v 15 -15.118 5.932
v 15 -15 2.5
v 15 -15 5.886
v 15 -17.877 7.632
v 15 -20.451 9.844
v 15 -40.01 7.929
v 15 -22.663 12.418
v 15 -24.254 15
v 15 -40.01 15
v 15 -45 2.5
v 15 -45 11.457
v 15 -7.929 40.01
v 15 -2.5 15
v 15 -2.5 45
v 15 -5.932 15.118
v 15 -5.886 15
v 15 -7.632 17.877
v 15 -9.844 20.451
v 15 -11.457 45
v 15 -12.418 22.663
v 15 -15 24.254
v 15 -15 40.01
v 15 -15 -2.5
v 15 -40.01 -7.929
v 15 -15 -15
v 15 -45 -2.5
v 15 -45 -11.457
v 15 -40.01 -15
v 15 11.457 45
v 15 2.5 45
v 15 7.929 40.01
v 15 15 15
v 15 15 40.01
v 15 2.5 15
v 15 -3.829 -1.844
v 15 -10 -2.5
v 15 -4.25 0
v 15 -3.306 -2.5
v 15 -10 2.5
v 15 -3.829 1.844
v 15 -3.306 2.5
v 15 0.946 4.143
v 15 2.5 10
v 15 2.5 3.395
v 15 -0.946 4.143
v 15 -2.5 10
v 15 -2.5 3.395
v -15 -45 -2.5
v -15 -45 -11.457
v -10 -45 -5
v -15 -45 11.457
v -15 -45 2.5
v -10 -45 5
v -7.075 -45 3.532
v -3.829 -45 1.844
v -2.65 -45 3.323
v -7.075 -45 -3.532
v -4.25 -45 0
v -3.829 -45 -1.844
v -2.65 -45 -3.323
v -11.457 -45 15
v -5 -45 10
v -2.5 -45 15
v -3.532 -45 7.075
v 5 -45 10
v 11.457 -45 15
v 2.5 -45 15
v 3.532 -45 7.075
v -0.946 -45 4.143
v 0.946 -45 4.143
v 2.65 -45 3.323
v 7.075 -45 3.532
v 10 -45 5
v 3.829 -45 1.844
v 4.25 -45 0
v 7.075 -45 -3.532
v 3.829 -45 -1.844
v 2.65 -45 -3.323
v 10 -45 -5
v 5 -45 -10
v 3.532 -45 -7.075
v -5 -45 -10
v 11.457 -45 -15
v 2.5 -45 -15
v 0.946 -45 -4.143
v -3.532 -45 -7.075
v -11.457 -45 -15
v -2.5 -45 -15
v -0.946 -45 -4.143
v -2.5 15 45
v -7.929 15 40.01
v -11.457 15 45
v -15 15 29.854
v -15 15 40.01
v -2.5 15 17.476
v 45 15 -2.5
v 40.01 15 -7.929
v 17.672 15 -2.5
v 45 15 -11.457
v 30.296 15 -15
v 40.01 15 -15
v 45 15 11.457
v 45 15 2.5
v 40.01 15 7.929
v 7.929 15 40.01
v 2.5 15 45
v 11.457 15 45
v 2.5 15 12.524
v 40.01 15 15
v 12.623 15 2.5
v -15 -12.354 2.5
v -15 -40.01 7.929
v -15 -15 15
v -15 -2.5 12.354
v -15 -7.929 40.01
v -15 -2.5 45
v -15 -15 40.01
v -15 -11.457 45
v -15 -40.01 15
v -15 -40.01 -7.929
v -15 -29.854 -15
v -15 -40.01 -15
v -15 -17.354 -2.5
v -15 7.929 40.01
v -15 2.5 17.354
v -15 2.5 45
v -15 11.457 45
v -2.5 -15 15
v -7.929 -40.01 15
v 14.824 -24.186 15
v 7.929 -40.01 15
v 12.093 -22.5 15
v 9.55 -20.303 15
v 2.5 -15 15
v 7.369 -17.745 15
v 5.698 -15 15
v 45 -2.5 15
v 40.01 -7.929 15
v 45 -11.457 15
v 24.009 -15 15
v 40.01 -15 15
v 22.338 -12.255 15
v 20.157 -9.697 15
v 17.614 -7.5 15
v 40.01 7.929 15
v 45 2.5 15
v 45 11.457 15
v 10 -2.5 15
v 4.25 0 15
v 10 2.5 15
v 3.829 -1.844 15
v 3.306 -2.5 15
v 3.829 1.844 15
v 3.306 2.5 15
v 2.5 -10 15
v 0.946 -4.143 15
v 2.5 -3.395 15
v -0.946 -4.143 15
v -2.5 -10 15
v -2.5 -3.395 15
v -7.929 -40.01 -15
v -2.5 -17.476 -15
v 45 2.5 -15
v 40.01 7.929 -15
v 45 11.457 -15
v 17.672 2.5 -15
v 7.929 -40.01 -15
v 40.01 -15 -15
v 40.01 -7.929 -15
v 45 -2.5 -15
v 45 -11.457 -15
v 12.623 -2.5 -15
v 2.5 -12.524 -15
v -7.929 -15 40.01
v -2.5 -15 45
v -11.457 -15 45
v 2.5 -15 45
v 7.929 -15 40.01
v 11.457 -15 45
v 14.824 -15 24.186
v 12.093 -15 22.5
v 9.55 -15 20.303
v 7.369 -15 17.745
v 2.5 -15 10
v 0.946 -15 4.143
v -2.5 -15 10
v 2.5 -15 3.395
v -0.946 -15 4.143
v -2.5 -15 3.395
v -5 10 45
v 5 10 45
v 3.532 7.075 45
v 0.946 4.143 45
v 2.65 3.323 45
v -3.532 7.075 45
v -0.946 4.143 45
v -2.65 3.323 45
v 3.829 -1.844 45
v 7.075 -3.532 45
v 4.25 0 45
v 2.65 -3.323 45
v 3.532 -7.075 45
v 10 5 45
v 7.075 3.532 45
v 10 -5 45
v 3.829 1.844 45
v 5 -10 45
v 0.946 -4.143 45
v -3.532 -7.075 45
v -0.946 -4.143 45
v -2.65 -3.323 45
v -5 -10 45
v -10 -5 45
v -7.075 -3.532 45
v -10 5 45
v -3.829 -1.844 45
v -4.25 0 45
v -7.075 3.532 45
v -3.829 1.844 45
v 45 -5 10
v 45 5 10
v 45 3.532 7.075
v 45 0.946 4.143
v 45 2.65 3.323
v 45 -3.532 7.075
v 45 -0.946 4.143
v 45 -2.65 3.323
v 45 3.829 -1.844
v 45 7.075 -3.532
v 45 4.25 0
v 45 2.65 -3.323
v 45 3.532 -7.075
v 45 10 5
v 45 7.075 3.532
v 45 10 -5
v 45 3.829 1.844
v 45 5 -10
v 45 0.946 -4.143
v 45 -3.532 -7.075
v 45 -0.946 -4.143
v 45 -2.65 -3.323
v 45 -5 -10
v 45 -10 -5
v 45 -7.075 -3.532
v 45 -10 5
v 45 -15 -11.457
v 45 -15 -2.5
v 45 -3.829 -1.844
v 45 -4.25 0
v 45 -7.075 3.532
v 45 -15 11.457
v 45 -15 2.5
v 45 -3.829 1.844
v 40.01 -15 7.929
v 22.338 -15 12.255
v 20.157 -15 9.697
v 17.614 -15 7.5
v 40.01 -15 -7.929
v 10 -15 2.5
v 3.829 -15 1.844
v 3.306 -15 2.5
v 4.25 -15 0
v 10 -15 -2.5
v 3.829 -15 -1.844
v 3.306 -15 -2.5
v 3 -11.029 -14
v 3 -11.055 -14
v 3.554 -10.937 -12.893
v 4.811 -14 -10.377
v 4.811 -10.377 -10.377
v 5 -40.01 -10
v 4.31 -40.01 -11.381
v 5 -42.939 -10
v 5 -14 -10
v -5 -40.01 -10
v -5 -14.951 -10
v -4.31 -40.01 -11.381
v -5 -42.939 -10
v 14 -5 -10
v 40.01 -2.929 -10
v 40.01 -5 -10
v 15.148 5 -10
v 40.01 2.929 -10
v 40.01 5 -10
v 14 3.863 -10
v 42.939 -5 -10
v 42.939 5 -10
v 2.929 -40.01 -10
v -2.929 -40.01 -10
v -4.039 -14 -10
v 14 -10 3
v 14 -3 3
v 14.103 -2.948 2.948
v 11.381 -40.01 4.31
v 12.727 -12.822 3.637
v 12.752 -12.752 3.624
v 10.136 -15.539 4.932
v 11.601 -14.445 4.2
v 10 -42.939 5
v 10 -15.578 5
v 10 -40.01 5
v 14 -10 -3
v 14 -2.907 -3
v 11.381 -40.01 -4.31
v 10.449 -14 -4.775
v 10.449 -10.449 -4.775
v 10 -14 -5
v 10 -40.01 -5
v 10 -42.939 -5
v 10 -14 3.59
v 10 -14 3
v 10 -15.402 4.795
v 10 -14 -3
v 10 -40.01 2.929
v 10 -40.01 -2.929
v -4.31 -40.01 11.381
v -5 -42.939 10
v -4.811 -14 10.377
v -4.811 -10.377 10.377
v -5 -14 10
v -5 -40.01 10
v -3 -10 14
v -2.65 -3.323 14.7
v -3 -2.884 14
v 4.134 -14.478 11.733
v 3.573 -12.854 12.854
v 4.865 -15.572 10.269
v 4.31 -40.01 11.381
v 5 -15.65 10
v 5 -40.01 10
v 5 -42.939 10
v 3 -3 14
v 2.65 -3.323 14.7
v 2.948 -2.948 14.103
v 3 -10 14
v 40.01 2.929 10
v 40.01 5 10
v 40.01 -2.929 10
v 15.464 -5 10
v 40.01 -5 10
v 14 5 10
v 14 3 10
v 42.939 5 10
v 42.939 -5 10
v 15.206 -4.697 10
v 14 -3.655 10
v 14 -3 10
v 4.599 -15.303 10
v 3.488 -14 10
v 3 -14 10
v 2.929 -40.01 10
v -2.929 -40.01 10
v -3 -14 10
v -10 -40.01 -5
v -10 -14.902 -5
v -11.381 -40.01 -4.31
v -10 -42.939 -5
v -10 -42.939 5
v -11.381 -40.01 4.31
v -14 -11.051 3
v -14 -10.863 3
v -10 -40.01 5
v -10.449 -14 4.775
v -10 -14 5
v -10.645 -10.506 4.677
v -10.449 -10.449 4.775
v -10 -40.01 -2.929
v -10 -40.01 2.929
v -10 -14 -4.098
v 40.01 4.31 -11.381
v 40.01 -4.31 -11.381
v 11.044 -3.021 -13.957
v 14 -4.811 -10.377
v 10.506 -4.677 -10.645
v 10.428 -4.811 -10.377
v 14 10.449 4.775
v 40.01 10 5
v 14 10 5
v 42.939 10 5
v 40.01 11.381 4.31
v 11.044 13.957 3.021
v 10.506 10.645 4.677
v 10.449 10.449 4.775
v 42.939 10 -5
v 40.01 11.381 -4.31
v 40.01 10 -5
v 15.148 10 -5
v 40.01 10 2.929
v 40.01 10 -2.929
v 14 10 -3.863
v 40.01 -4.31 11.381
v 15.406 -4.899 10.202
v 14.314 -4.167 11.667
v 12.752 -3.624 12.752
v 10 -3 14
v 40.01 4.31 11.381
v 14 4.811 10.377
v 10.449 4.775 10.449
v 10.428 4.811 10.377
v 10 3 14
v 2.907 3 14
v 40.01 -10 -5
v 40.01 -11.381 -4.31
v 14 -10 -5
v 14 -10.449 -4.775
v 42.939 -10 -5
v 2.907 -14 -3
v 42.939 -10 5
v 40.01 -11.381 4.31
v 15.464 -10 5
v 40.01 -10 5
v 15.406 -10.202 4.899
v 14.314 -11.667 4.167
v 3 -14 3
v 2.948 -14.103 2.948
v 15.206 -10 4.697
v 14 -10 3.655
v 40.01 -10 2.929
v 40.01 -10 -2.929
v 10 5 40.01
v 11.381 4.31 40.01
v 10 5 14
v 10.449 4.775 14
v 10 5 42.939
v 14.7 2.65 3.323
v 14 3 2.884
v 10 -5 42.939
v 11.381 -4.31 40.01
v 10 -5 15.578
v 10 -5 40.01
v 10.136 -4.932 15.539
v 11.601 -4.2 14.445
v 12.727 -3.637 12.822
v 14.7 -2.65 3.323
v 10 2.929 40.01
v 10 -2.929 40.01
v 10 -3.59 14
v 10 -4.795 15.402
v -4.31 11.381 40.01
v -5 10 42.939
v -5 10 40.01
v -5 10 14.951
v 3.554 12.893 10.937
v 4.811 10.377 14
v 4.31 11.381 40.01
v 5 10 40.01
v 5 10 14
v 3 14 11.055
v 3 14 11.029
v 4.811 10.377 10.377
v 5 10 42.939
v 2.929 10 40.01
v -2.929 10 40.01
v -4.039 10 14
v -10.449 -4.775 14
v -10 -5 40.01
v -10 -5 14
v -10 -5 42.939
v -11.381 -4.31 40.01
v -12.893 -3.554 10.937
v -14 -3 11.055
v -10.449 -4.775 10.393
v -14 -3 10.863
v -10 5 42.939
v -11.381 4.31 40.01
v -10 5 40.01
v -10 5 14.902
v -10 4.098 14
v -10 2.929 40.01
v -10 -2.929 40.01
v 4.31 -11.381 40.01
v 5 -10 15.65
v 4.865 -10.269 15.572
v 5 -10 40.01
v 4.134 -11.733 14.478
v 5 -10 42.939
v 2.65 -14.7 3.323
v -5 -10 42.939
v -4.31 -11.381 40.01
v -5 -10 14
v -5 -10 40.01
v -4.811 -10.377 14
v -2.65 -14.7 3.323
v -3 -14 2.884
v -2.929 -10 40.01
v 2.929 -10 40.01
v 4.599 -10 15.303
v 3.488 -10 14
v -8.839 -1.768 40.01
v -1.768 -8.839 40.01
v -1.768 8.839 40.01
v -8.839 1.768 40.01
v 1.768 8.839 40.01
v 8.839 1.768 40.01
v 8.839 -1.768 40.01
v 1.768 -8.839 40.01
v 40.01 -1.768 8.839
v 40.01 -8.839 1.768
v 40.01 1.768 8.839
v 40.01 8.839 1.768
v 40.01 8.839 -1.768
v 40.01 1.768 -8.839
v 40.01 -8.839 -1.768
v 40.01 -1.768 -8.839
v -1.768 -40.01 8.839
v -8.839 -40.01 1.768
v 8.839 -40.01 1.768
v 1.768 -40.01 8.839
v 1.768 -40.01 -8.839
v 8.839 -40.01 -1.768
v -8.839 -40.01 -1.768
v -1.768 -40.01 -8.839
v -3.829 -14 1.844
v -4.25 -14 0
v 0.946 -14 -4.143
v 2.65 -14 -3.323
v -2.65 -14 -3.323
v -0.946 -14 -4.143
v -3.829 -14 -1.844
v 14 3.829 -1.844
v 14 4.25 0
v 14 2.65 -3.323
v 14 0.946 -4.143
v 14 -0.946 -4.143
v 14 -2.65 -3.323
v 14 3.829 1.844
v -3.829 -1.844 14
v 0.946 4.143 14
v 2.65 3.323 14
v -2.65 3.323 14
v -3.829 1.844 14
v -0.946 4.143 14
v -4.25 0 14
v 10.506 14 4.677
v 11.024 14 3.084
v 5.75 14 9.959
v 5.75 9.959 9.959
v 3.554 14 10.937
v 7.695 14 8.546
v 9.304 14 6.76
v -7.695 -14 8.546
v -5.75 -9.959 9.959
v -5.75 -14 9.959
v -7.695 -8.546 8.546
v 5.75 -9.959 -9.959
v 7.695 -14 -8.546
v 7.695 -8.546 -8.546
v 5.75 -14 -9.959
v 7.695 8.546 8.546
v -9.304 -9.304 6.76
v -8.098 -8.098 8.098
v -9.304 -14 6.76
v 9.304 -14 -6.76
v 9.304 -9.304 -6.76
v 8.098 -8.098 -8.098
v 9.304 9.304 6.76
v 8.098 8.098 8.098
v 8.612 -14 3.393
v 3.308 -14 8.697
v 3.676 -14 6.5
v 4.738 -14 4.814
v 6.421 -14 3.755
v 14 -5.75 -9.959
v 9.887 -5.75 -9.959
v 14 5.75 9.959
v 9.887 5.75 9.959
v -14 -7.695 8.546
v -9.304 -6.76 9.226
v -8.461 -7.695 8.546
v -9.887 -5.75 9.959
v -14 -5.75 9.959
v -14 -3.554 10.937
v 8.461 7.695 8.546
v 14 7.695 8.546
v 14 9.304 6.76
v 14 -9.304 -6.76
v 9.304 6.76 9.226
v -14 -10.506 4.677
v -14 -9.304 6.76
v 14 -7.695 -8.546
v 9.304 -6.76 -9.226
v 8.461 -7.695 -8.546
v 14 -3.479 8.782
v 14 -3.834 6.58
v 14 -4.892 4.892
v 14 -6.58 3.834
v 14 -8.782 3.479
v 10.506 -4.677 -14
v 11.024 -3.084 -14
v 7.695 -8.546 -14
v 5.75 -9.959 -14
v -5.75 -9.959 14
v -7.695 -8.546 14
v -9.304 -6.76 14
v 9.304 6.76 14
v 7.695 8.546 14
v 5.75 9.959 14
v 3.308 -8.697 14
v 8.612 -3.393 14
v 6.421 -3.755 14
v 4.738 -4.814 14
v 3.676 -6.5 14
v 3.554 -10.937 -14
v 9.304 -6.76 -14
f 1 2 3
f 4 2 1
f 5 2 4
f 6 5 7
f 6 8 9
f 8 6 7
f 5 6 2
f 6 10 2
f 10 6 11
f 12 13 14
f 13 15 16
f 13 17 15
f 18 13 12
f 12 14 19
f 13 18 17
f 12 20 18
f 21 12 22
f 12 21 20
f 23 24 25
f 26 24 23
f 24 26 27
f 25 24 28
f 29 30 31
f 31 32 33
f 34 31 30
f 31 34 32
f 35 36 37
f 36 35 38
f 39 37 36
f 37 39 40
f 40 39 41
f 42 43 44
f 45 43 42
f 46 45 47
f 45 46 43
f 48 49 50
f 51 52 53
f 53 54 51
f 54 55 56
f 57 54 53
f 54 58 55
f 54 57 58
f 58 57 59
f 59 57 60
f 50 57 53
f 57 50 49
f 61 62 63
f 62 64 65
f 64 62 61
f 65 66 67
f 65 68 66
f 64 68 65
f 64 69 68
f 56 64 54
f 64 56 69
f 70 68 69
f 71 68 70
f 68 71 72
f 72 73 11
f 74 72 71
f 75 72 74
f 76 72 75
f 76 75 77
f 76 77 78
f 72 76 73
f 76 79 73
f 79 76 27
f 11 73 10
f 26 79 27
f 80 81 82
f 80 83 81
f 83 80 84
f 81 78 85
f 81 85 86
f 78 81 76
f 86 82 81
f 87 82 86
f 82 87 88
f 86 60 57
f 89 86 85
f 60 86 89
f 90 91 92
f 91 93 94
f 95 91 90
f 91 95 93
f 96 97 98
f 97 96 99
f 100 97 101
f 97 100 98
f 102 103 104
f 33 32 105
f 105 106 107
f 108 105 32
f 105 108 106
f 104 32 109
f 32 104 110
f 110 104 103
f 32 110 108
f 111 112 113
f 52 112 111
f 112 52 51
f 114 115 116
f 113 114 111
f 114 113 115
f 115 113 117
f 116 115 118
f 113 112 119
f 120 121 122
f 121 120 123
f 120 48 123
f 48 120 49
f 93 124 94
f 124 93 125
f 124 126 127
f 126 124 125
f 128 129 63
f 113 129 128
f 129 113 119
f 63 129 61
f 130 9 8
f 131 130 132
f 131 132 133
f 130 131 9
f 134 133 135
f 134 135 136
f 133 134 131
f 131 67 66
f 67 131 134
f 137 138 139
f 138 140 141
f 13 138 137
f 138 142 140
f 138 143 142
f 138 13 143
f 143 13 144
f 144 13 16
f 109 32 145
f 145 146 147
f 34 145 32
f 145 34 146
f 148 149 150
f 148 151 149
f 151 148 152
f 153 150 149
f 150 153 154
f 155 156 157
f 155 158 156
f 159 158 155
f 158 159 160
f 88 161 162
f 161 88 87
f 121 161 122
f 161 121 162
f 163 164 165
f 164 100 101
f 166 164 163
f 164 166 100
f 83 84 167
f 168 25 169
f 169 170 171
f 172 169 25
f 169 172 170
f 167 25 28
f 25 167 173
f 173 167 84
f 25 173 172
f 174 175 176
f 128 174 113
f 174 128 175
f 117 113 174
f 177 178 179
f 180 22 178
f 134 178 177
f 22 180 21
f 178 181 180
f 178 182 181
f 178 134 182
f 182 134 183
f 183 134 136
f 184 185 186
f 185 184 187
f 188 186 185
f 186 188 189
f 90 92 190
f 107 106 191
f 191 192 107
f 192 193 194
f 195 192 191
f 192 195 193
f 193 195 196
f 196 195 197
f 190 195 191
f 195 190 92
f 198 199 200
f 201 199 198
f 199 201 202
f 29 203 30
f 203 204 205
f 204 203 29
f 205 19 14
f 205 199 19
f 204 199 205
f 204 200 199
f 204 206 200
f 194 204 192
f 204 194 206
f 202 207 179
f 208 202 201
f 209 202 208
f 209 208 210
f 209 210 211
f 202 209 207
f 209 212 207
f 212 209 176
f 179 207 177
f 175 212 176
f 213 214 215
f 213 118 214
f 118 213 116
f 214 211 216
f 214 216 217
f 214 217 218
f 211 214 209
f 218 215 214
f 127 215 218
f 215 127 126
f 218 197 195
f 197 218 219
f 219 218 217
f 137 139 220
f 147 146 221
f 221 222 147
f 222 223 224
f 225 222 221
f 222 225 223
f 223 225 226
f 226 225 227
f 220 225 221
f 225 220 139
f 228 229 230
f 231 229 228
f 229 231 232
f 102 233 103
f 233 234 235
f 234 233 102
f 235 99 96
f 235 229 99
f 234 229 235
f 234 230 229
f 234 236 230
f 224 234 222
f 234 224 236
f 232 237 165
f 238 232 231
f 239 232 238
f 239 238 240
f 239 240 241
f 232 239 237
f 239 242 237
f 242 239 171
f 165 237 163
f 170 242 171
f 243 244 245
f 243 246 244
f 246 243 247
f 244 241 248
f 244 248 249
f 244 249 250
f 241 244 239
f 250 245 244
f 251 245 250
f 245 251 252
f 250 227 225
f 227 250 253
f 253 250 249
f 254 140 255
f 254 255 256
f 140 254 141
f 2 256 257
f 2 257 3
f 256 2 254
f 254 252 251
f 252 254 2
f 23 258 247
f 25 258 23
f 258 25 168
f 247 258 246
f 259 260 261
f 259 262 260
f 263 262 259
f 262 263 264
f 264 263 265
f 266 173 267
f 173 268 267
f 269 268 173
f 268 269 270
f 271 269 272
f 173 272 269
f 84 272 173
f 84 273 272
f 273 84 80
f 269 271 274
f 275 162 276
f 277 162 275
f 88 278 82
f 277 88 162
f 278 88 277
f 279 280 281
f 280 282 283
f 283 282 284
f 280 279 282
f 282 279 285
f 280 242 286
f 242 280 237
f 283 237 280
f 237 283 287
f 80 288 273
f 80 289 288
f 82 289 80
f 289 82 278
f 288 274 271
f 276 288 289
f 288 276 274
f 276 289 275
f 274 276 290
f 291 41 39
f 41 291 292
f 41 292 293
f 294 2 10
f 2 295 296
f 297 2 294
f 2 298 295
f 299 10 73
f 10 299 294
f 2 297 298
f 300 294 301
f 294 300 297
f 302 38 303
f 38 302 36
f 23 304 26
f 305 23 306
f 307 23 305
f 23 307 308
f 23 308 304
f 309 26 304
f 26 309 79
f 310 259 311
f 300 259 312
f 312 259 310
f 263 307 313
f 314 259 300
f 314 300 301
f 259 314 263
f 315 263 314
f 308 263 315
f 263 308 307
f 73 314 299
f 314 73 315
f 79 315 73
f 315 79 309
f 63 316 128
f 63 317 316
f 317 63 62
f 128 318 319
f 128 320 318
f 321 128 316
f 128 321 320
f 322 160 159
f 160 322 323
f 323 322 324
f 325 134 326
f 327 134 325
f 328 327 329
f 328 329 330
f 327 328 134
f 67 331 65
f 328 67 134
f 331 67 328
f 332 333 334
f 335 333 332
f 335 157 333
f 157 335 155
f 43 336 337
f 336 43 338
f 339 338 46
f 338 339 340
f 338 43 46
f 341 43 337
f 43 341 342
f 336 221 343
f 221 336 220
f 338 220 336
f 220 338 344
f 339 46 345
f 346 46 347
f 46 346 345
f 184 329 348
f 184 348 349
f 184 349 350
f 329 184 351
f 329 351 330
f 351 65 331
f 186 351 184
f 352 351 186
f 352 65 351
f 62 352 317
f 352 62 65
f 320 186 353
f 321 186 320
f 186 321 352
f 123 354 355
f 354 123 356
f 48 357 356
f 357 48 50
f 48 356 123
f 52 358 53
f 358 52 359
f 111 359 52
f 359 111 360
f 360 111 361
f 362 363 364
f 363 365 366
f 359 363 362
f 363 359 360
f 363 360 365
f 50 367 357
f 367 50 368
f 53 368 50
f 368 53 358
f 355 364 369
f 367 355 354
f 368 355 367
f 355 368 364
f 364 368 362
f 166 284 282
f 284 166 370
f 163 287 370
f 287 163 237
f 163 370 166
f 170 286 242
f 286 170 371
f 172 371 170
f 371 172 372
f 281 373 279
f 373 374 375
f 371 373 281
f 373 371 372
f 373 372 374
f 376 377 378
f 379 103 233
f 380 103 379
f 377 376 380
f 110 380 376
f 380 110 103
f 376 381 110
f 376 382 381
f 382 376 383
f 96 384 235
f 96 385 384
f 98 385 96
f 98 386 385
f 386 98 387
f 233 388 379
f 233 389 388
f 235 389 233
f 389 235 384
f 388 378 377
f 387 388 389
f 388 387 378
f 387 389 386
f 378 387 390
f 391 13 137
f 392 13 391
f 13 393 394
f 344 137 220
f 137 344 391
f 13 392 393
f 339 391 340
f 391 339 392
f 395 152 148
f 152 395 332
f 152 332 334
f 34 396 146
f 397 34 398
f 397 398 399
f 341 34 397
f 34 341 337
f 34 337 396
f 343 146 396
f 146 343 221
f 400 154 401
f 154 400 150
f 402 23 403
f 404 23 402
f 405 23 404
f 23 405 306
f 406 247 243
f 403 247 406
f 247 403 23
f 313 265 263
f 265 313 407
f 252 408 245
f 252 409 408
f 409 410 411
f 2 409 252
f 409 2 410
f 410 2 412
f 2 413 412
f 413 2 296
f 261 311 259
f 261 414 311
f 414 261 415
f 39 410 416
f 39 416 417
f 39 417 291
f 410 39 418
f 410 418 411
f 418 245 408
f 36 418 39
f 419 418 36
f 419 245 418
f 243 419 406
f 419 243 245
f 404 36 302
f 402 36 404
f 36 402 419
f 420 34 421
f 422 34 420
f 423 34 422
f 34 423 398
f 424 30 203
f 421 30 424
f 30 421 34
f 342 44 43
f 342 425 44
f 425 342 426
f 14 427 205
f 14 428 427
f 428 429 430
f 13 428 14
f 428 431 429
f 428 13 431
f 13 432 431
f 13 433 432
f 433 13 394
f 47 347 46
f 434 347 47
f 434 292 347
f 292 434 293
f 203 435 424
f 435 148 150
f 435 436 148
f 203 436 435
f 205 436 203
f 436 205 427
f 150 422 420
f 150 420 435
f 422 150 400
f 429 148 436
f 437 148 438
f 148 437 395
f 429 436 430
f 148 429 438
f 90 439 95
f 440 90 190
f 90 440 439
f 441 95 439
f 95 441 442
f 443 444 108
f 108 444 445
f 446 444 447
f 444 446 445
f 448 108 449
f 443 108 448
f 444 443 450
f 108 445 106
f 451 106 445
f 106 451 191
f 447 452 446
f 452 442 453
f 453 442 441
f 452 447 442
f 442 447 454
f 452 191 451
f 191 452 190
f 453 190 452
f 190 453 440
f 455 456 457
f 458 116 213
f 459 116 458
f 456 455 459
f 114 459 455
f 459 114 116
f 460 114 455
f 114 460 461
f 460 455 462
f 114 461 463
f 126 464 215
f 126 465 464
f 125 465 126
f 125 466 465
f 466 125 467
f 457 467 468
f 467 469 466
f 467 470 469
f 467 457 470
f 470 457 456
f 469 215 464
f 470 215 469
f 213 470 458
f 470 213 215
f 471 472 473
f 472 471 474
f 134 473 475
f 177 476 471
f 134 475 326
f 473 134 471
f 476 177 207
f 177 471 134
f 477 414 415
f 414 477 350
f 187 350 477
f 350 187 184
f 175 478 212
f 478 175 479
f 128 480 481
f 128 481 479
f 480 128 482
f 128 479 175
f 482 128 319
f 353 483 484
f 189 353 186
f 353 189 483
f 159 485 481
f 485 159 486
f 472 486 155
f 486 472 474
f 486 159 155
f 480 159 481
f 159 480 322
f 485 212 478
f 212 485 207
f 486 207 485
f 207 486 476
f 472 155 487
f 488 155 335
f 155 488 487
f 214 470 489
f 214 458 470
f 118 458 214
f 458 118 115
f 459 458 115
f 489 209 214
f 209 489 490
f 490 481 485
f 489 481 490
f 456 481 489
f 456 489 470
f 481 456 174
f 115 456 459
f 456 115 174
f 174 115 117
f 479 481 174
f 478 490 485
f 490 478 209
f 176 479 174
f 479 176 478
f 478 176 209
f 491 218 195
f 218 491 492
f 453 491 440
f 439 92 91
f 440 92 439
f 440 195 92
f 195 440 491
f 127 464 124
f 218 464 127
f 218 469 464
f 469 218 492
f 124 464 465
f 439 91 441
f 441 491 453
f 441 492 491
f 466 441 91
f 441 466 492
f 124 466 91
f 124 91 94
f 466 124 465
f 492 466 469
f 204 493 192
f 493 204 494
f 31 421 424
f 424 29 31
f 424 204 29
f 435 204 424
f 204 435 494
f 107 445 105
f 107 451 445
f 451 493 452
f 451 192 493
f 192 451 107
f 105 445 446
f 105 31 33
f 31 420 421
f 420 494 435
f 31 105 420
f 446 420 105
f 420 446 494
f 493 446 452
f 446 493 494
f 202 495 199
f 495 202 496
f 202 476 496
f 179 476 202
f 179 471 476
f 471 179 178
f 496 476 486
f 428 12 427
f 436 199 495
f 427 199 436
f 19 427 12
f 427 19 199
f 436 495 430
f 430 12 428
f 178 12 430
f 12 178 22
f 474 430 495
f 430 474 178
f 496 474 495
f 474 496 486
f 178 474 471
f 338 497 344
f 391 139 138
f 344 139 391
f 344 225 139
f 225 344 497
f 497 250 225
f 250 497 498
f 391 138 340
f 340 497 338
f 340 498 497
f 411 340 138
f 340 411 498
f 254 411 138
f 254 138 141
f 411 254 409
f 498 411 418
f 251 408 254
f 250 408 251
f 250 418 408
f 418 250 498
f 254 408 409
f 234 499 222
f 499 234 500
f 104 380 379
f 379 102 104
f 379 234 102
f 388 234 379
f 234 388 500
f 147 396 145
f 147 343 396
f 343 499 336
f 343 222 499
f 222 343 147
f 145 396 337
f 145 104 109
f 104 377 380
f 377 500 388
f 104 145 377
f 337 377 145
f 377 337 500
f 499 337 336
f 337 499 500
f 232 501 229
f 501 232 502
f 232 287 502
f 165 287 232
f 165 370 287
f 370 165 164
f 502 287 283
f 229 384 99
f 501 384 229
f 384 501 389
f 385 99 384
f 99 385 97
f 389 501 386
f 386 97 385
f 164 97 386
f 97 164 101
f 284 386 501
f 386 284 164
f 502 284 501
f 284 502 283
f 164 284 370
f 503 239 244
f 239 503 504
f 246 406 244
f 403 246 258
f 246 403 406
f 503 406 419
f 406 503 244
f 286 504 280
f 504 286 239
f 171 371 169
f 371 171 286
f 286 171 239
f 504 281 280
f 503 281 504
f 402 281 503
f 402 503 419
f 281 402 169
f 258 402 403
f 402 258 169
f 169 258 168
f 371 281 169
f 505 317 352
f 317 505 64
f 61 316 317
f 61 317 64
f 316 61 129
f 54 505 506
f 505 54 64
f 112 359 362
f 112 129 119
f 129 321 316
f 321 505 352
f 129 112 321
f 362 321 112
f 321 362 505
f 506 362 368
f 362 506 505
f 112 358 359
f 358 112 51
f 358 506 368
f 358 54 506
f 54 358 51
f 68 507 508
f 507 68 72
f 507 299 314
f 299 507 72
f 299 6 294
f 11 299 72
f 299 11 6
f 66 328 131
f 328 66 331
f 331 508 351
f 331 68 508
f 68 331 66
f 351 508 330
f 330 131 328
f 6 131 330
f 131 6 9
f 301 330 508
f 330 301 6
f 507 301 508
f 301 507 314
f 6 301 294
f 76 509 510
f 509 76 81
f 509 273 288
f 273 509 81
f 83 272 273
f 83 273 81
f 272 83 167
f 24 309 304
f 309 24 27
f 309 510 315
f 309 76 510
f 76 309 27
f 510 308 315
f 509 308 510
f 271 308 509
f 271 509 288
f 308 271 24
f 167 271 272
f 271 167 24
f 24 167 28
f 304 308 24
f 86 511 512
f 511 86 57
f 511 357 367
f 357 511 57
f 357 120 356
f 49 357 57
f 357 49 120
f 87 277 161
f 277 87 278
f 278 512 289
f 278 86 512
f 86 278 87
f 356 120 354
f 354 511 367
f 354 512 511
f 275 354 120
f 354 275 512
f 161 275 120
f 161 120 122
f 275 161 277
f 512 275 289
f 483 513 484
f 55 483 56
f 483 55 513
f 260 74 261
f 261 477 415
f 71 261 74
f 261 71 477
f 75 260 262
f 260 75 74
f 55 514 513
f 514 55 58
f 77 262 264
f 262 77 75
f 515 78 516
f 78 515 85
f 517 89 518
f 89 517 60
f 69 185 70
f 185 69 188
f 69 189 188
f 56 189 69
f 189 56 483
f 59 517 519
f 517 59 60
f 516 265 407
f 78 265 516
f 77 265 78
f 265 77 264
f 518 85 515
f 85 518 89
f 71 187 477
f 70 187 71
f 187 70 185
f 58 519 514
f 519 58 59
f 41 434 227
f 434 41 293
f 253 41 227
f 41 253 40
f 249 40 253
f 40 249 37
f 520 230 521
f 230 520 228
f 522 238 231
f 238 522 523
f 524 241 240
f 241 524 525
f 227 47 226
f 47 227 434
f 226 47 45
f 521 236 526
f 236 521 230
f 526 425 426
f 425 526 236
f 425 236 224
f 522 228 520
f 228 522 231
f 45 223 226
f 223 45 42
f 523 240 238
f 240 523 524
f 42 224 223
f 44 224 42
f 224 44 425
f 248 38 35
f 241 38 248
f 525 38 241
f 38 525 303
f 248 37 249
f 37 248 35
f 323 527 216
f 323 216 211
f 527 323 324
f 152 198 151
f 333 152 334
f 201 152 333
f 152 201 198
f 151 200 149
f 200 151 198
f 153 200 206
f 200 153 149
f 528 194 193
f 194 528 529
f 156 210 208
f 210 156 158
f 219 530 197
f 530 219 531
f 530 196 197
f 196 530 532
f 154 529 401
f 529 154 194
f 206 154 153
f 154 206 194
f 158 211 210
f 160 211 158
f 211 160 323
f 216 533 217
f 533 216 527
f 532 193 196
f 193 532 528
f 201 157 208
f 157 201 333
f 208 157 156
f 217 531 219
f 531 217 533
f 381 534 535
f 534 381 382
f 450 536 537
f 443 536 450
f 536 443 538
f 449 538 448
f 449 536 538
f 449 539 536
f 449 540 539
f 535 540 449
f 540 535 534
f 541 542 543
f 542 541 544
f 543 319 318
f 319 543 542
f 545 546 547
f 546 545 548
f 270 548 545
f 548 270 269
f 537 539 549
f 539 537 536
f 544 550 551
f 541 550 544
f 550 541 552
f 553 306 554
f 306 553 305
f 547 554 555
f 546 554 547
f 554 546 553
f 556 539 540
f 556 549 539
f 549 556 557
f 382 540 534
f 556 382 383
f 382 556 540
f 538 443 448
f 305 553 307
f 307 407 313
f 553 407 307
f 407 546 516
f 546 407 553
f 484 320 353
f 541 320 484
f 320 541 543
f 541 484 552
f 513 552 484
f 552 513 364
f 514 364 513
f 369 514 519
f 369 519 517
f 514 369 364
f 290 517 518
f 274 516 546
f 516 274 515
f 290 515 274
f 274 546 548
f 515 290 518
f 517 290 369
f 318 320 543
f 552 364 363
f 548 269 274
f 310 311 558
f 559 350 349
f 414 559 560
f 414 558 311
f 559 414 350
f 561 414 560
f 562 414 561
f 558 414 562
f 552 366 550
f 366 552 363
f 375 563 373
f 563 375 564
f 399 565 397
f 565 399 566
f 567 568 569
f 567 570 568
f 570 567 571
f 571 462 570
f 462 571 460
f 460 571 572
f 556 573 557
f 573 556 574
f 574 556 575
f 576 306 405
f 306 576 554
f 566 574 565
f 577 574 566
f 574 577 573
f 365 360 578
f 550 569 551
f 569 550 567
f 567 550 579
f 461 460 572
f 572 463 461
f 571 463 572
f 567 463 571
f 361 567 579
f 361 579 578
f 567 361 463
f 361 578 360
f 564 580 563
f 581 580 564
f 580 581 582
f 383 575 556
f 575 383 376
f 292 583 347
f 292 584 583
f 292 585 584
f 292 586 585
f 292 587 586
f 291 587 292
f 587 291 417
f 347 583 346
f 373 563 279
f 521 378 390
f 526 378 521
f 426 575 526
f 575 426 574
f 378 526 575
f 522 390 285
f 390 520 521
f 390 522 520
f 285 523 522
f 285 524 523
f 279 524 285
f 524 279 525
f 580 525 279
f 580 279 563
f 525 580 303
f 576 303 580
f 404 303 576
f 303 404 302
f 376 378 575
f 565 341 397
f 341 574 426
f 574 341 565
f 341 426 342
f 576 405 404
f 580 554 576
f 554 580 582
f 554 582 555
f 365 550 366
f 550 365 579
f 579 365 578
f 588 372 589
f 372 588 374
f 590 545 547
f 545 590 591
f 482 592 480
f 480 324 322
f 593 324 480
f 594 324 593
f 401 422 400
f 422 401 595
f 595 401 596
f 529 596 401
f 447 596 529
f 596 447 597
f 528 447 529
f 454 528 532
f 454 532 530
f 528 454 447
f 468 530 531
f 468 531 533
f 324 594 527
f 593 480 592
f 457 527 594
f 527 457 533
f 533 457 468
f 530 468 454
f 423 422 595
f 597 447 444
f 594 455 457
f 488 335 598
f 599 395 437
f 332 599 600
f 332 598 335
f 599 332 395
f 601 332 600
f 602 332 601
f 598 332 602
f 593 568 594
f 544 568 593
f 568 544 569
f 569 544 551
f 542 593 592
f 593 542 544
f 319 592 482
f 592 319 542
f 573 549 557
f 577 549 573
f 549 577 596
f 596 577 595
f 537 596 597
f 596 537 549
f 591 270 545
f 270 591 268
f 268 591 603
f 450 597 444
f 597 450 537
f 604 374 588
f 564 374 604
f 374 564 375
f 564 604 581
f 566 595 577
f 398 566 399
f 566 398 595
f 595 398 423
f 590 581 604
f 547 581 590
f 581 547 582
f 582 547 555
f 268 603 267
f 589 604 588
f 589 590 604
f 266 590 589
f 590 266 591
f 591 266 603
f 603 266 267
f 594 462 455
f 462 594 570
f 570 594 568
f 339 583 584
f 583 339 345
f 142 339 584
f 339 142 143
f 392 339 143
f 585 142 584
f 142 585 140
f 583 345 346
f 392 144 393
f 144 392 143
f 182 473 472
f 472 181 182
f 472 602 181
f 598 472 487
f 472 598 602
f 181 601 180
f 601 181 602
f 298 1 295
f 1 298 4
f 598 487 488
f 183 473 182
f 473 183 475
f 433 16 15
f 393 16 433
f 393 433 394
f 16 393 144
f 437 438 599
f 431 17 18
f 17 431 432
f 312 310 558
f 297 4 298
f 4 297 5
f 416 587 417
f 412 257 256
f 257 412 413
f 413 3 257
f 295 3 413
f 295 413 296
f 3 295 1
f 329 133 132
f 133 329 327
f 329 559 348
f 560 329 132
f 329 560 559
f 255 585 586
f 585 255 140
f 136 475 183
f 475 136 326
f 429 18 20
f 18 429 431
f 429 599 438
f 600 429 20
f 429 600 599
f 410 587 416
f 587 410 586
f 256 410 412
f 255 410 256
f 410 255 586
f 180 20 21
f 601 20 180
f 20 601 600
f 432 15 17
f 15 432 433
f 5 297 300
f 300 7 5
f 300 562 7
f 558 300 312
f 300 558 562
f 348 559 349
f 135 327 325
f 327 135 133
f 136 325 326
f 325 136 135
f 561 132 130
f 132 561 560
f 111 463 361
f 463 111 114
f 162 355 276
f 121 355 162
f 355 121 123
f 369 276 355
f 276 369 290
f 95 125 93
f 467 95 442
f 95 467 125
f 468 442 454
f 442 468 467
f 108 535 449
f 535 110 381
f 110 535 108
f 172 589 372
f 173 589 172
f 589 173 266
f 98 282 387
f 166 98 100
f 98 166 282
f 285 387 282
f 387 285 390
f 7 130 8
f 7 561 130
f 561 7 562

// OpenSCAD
// file: globals.scad
/*
Most things in this file is represented as one millimeter, so keep that in mind while changing things.
Some of the setting are not mm but at variables that you can set, such as 2*x=2x and you are setting what x is.
I will try to specify when things are variables and not exact measurements.
*/

obj_leg = 30;
leg_length = 5.5;
small_number = 0.001;
metal_core_rode_global = 5;


///////////////// number of holes /////////////////////
z_hole_number = 8;
other_holes = 8;

///////////////// Pins /////////////////////

//pins that poke out
ball_size = 10;
pin_height = 20;
pin_diameter = 6;


//holes
hole_ball_size = ball_size;
hole_pin_height = pin_height;
hole_pin_diameter = pin_diameter;

///////////////// Z THINGS /////////////////////

berring_slot_width = 7.5;
berring_slot_depth = 6.5;
metal_core_rode = 5;

///////////////// X THINGS /////////////////////

//male dove tails
max_width=10;
min_width=5;
depth=5;
height=obj_leg/2;

//female dove tails, this is found on the y mounts
girl_max_width=11;
girl_min_width=5;
girl_depth=5;
girl_height=obj_leg;


///////////////// Y THINGS /////////////////////
/*
The Y is so normal that all of those global variables at the top should change all of the setting in it, this section is set her incase there are variables set in the future development of this project.
*/
// file: include.scad
//////////////////      END SECTION       //////////////////

	module added_pins(){
		difference(){
			union(){
				translate([30/(15/4),obj_leg*leg_length,30/(15/4)]) pin();
				translate([30/(15/4)+14.5,obj_leg*leg_length,30/(15/4)+14]) pin();
			}
			union(){
							translate([30/(15/4)+13.5,obj_leg*leg_length-20,30/(15/4)+5])cube(size=[2,40,15]);
							translate([30/(15/4)+7.5,obj_leg*leg_length-20,30/(15/4)+15])rotate([0,90,0]) cube(size=[2,40,15]);	

							translate([30/(15/4)-1,obj_leg*leg_length-20,30/(15/4)-8])cube(size=[2,40,15]);
							translate([30/(15/4)-10,obj_leg*leg_length-20,30/(15/4)+1])rotate([0,90,0]) cube(size=[2,40,15]);
			}
		}
	}
	module taken_pins() {
		translate([30/(15/4)+14,obj_leg*leg_length-10,30/(15/4)]) mirror_pin();
		translate([30/(15/4),obj_leg*leg_length-10,30/(15/4)+15]) mirror_pin();
	}


//////////////////      OTHER STUFF       //////////////////

	module holes() {
		rotate([0,0,90]) for(y=[0:other_holes])
		translate([obj_leg+y*15,-15.5,7.5]) union() {
			translate([7.5,0,15]) hole_up();
			hole_down();
		}
	}
	module extend_holes() {
	module top(){
		rotate([0,0,90]) for(y=[0:other_holes+1])
		translate([(30/4)+y*15,-15.5,7.5]) union() {
			translate([7.5,0,15]) hole_up();
		}
	}
	module bottom(){
		rotate([0,0,90]) for(y=[0:other_holes+2])
		translate([(30/4)+y*15,-15.5,7.5]) union() {
			hole_down();
		
}
	}
	union(){
		top();
		bottom();
	}
	}

	module hole() {
		union() {
			rotate([90, 90, 0]) cylinder(h=40, d=hole_pin_diameter, center=true);
			translate([0,7.5,0]) sphere(d=hole_ball_size);
			translate([0,-6,0]) sphere(d=hole_ball_size);
		}
	}
	module hole_up() {
		union() {
			rotate([90, 90, 0]) cylinder(h=40, d=hole_pin_diameter, center=true);
			translate([0,7.5,10]) cylinder(h=hole_pin_height, d=hole_pin_diameter, center=true);
			translate([0,-6,10]) cylinder(h=hole_pin_height, d=hole_pin_diameter, center=true);
			translate([0,7.5,0]) sphere(d=hole_ball_size);
			translate([0,-6,0]) sphere(d=hole_ball_size);
		}
	}
	module hole_down() {
		union() {
			rotate([90, 90, 0]) cylinder(h=40, d=hole_pin_diameter, center=true);
			translate([0,7.5,-10]) cylinder(h=hole_pin_height, d=hole_pin_diameter, center=true);
			translate([0,-6,-10]) cylinder(h=hole_pin_height, d=hole_pin_diameter, center=true);
			translate([0,7.5,0]) sphere(d=hole_ball_size);
			translate([0,-6,0]) sphere(d=hole_ball_size);
		}
	}
	module pin() {
		union() {
			rotate([90, 90, 0]) cylinder(h=pin_height, d=pin_diameter, center=true);
			translate([0,7.5,0]) sphere(d=ball_size);
		}
	}

	module mirror_pin() {
		rotate([90, 90, 0]) cylinder(h=hole_pin_height+small_number, d=hole_pin_diameter, center=true);
		translate([0,-(pin_height-(ball_size/2)),0]) sphere(d=ball_size);
	}


//////////////////      SOME RACK AND Z THINGS       //////////////////

module z_holes() {
    rotate([0,-90,0]) for(z=[0:z_hole_number])
    translate([22.5+z*15,16,-12])
        hole();
}

module pin_cuts() {
	union(){
		cube(size=[2,10,40], center=true);
		rotate([0,0,90]) cube(size=[2,10,40], center=true);
	}
}
module pin_uncut() {
	union(){
		rotate([0, 0, 90]) cylinder(h=hole_pin_height, d=hole_pin_diameter, center=true);
		translate([0,0,10]) sphere(d=ball_hole);
	}
}


module pin_out() {
	union(){
		rotate([0, 0, 90]) cylinder(h=pin_height, d=pin_diameter, center=true);
		translate([0,0,10]) sphere(d= ball_size);
	}
}


module pins_z(){
	difference() {
		pin_out();
		pin_cuts();
	}
}
//////////////////      RACK AND SLIDE     ///////////////////

module straight_pins() {
	for(z=[0:((((obj_leg*leg_length)*2)-(obj_leg*2))/3)/14.5]) rotate([-90,0,0]) translate([z*15,30/(15/4),14]) pins_z();
	for(z=[0:((((obj_leg*leg_length)*2)-(obj_leg*2))/3)/14.5]) rotate([-90,0,0]) translate([z*15,30/(15/4)-14,14]) pins_z();
}
module stagger_pins() {
	for(z=[0:((((obj_leg*leg_length)*2)-(obj_leg*2))/3)/14.5]) rotate([-90,0,0]) translate([z*15,30/(15/4),14]) pins_z();
	for(z=[0:((((obj_leg*leg_length)*2)-(obj_leg*2))/3)/14.5]) rotate([-90,0,0]) translate([z*15+7,30/(15/4)-14,14]) pins_z();
}


//////////////////      DOVE TAIL       //////////////////

module male_dovetail(height) {
	dovetail_3d(max_width,min_width,depth,height);
}

module dovetail_3d(max_width=11, min_width=5, depth=5, height=30) {
	linear_extrude(height=height, convexity=2)
		dovetail_2d(max_width,min_width,depth);
}

module dovetail_2d(max_width=11, min_width=5, depth=5) {
	angle=atan((max_width/2-min_width/2)/depth);
	echo("angle: ", angle);
	polygon(paths=[[0,1,2,3,0]], points=[[-min_width/2,0], [-max_width/2,depth], [max_width/2, depth], [min_width/2,0]]);
}

//bow tie
	module tie_end(height){
				rotate([0,0,0]) translate([0,-0.01,((obj_leg/2)/2)]) male_dovetail(height);
				rotate([0,90,0]) translate([0,-0.01,((obj_leg/2)/2)]) male_dovetail(height);
				rotate([0,180,0]) translate([0,-0.01,((obj_leg/2)/2)]) male_dovetail(height);
				rotate([0,-90,0]) translate([0,-0.01,((obj_leg/2)/2)]) male_dovetail(height);
	}

module bow_support(){
	difference(){
		intersection(){
			translate([-15,0,-15]) cube([30,9,30]);
			scale([1.05,1.05,1.05]) rotate([0,45,0]) tie_end();
		}
		cube([29.2,29.2,29.2], center=true);
	}
}

	module wrap(){
		depth = 30;
				translate([-15,30,15]) rotate([90,180,90]) male_dovetail(height=depth);
				rotate([0,90,0]) translate([-15,30,15]) rotate([90,180,90]) male_dovetail(height=depth);
				rotate([0,180,0]) translate([-15,30,15]) rotate([90,180,90]) male_dovetail(height=depth);
				rotate([0,-90,0]) translate([-15,30,15]) rotate([90,180,90]) male_dovetail(height=depth);
	}
// main file
include <include.scad>;
include <globals.scad>;
//if you can do pretty far over hangs, like an SLA printer or something then take this off by setting it to flase.
    support = false;
	slot_translate = .5;
	rod_size = .5;
module basic_corner(){
	module added(){
			translate([0,0,15]) cube([obj_leg,obj_leg,obj_leg*2], center=true);
			translate([0,15,0]) cube([obj_leg,obj_leg*2,obj_leg], center=true);
			translate([15,0,0]) cube([obj_leg*2,obj_leg,obj_leg], center=true);
	}
	module taken(){
		cylinder(d=8.5, h=obj_leg*5, center=true);
		rotate([0,90,0]) cylinder(d=8.5, h=obj_leg*5, center=true);
		rotate([90,0,0]) cylinder(d=8.5, h=obj_leg*5, center=true);
		cylinder(d=23, h=28, center=true);
		rotate([0,90,0]) cylinder(d=23, h=28, center=true);
		rotate([90,0,0]) cylinder(d=23, h=28, center=true);
		module wrap(){
			translate([0,-15,0]) male_dovetail(height=50);
			rotate([0,0,90]) translate([0,-15,0]) male_dovetail(height=50);
			rotate([0,0,180]) translate([0,-15,0]) male_dovetail(height=50);
			rotate([0,0,-90]) translate([0,-15,0]) male_dovetail(height=50);
		}
		wrap();
		rotate([0,90,0]) wrap();
		rotate([-90,90,0]) wrap();
		rotate([0,45,180]) translate([0,-45,0]) tie_end();
		rotate([0,45,90]) translate([0,-45,0]) tie_end();
		rotate([-90,0,45]) translate([0,-45,0]) tie_end();

	}
	module corner() {
		difference(){
			added();
			taken();
		}
	};
	rotate([45,0,0]) corner();
};
module full_corner(){
	module support_pillers(){
		
		translate([48-slot_translate/2,3,0]) cylinder(h=11,d=4);
		translate([48-slot_translate/2,-3,0]) cylinder(h=11,d=4);
		
		translate([39-slot_translate/2,18,24]) rotate([0,-40,0]) cylinder(h=6,d=4);
		translate([39-slot_translate/2,-18,24]) rotate([0,-40,0]) cylinder(h=6,d=4);
	}
	if (support==true)
	{
		support_pillers();
		rotate([0,0,(360/3)*2]) support_pillers();
		rotate([0,0,(360/3)*1]) support_pillers();
	}
	difference(){
		translate([0,0,0]) rotate([0,-35,0])basic_corner();
		union(){
			cylinder(h=50, d=15);
			//translate([-20,0,0]) cylinder(h=50, d=7);
			//translate([10,17,0]) cylinder(h=50, d=7);
			//translate([10,-17,0]) cylinder(h=50, d=7);
			translate([0,0,-25]) cube([200,200,50], center=true);
		}
	}
}

rotate([45,0,0]) rotate([0,35,0]) full_corner();
